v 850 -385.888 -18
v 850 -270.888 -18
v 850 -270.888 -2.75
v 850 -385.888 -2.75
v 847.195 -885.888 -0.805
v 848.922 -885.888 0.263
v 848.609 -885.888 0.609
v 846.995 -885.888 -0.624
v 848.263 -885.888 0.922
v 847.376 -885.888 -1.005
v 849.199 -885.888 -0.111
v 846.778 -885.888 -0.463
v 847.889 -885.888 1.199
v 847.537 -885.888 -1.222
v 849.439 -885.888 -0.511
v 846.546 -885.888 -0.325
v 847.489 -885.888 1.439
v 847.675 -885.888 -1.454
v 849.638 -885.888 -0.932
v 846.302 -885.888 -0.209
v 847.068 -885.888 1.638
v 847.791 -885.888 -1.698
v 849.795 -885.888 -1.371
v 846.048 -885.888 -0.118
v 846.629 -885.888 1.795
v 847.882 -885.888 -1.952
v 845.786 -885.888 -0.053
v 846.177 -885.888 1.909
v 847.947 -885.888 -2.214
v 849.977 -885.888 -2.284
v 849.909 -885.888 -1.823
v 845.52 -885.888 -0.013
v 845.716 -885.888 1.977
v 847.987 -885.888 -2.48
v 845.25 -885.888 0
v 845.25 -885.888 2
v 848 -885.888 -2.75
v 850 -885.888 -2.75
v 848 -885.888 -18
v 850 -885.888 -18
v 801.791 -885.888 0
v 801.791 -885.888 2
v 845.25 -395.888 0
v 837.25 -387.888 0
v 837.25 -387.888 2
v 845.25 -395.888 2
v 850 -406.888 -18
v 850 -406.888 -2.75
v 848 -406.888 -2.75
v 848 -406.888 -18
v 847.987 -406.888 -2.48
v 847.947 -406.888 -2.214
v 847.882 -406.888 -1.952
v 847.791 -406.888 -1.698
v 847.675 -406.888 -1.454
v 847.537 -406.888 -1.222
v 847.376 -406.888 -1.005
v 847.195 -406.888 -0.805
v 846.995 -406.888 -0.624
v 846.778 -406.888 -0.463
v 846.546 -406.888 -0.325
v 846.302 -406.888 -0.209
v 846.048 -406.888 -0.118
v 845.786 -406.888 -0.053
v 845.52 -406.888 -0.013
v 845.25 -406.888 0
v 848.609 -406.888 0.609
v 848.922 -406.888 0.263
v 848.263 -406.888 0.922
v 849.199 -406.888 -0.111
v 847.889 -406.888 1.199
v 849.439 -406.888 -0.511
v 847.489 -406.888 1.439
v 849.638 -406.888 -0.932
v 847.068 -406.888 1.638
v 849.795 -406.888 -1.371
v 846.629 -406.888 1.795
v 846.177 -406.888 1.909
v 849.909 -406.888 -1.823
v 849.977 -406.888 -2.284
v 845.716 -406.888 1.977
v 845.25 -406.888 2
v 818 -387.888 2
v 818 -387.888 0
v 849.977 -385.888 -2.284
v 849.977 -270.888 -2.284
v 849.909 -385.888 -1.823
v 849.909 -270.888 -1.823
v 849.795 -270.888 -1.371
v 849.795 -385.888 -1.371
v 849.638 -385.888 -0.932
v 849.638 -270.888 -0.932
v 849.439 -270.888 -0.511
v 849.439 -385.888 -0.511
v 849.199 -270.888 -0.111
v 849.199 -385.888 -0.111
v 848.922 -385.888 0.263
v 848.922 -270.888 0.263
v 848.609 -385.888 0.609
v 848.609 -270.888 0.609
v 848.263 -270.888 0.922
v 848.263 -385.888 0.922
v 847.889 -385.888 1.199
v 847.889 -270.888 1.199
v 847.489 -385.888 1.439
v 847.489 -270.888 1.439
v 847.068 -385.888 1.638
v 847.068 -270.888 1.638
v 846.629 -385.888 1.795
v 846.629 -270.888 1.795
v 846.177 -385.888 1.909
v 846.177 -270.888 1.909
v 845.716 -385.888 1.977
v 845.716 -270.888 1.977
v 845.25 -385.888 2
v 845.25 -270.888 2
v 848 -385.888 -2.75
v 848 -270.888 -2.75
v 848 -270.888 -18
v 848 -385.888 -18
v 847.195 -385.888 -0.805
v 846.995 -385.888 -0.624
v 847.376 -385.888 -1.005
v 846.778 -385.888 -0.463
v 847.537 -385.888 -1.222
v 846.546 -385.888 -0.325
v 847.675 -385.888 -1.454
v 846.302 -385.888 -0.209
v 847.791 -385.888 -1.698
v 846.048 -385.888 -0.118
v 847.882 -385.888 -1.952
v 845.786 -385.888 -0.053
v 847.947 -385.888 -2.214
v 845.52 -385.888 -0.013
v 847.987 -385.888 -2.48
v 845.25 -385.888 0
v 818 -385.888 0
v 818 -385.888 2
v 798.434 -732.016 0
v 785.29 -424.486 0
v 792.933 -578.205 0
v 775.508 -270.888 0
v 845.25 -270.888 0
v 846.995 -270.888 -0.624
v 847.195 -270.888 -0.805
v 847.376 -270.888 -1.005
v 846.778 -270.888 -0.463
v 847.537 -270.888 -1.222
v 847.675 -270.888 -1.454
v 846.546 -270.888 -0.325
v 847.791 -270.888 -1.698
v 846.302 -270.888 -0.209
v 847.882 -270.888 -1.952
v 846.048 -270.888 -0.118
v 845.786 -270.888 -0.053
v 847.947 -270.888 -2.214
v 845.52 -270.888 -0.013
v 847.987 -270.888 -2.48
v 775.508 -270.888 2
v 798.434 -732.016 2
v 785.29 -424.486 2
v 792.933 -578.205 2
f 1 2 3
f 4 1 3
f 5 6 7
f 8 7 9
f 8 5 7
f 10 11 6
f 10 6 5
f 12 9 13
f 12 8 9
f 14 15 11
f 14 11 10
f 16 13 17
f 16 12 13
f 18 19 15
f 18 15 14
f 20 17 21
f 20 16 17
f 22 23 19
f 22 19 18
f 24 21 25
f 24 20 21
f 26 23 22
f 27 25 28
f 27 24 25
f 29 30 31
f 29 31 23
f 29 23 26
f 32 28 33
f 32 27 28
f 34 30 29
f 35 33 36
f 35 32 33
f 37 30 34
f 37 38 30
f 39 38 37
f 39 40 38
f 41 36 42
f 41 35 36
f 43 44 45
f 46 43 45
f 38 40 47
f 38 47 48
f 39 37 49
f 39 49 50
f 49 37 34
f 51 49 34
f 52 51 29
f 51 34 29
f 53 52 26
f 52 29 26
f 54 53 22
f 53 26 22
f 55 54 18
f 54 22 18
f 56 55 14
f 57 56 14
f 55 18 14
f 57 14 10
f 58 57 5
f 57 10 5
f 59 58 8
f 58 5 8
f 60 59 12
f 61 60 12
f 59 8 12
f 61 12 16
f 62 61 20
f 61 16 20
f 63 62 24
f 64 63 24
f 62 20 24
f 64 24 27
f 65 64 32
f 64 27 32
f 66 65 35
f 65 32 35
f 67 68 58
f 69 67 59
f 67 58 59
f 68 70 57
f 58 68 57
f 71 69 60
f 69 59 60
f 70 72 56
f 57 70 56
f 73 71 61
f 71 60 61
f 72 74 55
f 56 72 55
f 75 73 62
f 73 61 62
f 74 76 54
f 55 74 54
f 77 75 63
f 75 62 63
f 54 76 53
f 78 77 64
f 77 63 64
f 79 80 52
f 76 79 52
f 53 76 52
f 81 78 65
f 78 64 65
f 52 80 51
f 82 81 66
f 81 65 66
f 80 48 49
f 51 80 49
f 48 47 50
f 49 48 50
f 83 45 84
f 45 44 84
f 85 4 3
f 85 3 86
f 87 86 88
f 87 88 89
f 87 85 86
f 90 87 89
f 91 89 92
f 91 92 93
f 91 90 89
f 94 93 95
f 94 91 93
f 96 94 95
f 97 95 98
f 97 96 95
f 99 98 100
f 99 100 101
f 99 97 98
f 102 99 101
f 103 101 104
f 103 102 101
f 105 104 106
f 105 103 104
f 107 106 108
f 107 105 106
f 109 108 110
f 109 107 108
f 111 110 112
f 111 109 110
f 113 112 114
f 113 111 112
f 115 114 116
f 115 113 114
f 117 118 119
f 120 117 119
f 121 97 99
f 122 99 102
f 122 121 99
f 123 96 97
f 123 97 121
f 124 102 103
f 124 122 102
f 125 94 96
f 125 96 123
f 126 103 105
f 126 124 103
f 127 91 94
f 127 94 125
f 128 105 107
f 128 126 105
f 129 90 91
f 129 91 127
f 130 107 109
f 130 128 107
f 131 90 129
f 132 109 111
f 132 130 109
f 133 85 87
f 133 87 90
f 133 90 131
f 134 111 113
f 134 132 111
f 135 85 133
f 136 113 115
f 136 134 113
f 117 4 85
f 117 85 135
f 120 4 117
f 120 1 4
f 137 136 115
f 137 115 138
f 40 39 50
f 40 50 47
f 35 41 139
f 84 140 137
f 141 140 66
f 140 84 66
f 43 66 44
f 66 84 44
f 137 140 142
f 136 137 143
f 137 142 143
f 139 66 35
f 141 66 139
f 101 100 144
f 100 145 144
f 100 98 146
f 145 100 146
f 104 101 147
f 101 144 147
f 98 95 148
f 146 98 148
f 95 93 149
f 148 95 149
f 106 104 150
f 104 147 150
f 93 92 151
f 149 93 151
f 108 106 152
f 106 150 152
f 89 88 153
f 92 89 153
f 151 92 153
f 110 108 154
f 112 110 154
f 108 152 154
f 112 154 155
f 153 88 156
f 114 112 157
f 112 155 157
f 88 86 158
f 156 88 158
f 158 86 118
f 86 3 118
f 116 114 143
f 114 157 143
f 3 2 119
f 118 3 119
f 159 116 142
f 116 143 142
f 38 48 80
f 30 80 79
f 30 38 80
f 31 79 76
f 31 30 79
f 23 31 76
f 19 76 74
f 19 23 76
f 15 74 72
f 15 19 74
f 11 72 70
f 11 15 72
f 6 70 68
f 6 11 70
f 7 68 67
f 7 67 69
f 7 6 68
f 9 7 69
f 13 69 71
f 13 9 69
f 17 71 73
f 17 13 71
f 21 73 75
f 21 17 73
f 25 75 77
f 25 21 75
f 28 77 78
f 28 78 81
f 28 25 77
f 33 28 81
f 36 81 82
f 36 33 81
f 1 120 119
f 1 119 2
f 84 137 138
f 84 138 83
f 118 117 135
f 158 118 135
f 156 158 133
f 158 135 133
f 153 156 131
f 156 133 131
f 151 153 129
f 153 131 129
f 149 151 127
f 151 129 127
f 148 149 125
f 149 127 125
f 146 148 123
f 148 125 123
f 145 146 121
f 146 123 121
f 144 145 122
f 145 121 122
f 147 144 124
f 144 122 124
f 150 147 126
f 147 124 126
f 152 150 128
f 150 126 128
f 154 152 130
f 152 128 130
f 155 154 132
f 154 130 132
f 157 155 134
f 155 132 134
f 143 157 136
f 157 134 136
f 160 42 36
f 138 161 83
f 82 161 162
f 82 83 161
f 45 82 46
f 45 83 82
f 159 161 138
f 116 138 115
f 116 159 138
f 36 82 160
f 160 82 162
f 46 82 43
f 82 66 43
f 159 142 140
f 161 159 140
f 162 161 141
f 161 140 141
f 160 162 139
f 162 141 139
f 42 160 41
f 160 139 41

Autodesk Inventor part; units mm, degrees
ref_plane "YZ Plane" through (0, 0, 0) normal (1, 0, 0) x (0, 1, 0)
ref_plane "XZ Plane" through (0, 0, 0) normal (0, 1, 0) x (-1, 0, 0)
ref_plane "XY Plane" through (0, 0, 0) normal (0, 0, 1) x (1, 0, 0)
sketch "Sketch1" plane through (0, 0, 0) normal (0, 0, 1) x (1, 0, 0)
  arc A0 (750, -2100) -> (771.0671, -250.888) centre (-10250, -1050) ccw construction
  arc A1 (752.9864, -2100.2851) -> (772.2226, -225.7318) centre (-10246.9893, -1050.0309) ccw
  line L0 (-750, -2700) -> (-750, 0) construction
  line L1 (-800, 50) -> (-800, -2750) construction
  line L2 (-850, -2800) -> (-850, 100) construction
  line L3 (850, 100) -> (850, -2800)
  line L4 (800, -2750) -> (800, 50) construction
  line L5 (750, 0) -> (750, -2700) construction
  line L6 (771.0671, -250.888) -> (768.075, -251.105) construction
  line L7 (769.231, -225.9556) -> (772.2226, -225.7318) construction
  arc A2 (747.4657, -5.0326) -> (744.8748, -2.3426) centre (744.4792, -5.3164) ccw construction
  arc A3 (747.4657, -5.0326) -> (747.0136, -0.2851) centre (-10252.9897, -1050.251) ccw construction
  arc A4 (768.075, -251.105) -> (747.4657, -5.0326) centre (-10252.9897, -1050.251) ccw construction
  line L8 (750, 0) -> (747.0136, -0.2851) construction
  arc A5 (750.4522, -4.7486) -> (750, 0) centre (-10250, -1050) ccw construction
  arc A6 (750.4522, -4.7486) -> (745.2706, 0.6314) centre (744.4791, -5.3162) ccw
  line L9 (-750, 0) -> (750, 0) construction
  line L10 (-850, 100) -> (850, 100) construction
  line L11 (800, 50) -> (-800, 50) construction
  arc A7 (771.0671, -250.888) -> (750.4522, -4.7486) centre (-10250, -1050) ccw
  line L12 (750, -2700) -> (-750, -2700) construction
  line L13 (750, -2100) -> (752.9864, -2100.2851) construction
  line L14 (-800, -2750) -> (800, -2750)
  line L15 (850, -2800) -> (-850, -2800) construction
  arc A8 (110, -2700) -> (114.1118, -2698.3696) centre (110, -2694) ccw construction
  line L16 (0, -2697) -> (110, -2697) construction
  line L17 (0, -2700) -> (0, -2697) construction
  arc A9 (750, 0) -> (745.2706, 0.6314) centre (0, -5600) ccw construction
  line L18 (750, 0) -> (749.6018, -2.9735) construction
  arc A10 (750, -3.0268) -> (0, 47) centre (-0.2, -5603) ccw construction
  line L19 (0, 47) -> (0, 0) construction
  line L20 (0, 50) -> (0, 47) construction
  line L21 (0, 100) -> (0, 50)
  arc A11 (745.2706, 0.6314) -> (0, 50) centre (0, -5600) ccw construction
  line L22 (-750, -2100) -> (750, -2100) construction
  arc A12 (110, -2697) -> (112.0559, -2696.1848) centre (110, -2694) ccw construction
  line L23 (676.3163, -2173.4556) -> (674.2605, -2171.2708) construction
  line L24 (690.4112, -2151.9536) -> (692.4671, -2154.1384) construction
  line L25 (752.0559, -2102.1848) -> (676.3163, -2173.4556) construction
  line L26 (114.1118, -2698.3696) -> (750, -2100) construction
  arc A13 (752.0559, -2102.1848) -> (752.9864, -2100.2851) centre (749.9998, -2099.9999) ccw construction
  line L27 (750, -2100) -> (752.0559, -2102.1848) construction
  arc A14 (749.1768, -2100.7746) -> (750.1074, -2098.8746) centre (747.1209, -2098.5898) ccw construction
  line L28 (112.0559, -2696.1848) -> (690.4112, -2151.9536) construction
  line L29 (850, -270.888) -> (775.5075, -270.888)
  arc A15 (800, 50) -> (0, 100) centre (0, -6325) ccw construction
  arc A16 (825.5075, -270.888) -> (800, 50) centre (-10637.5382, -1020.6324) ccw construction
  line L30 (825.5075, -270.888) -> (825.5075, 100) construction
  arc A17 (790.2374, -2130.793) -> (825.5075, -270.888) centre (-10200.9329, -992.0761) ccw construction
  line L31 (0, -2700) -> (0, -2750) construction
  line L32 (112.3791, -2700) -> (132.2053, -2750) construction
  line L33 (132.2053, -2750) -> (850, -2074.5565)
  arc A18 (771.0107, -250.8921) -> (767.3384, -201.0273) centre (769.231, -225.9556) ccw construction
  line L34 (850, -400) -> (783.8747, -400) construction
  line L35 (850, -900) -> (801.9921, -900) construction
  line L36 (850, -1400) -> (797.4673, -1400) construction
  line L37 (850, -1900) -> (770.2723, -1900) construction
  line L38 (350, 100) -> (350, 39.1489)
  line L39 (-1472.612, -150) -> (-973.4947, -150)
  line L40 (-1472.612, -700) -> (-973.4947, -700)
  line L41 (-1472.612, -1250) -> (-973.4947, -1250)
  line L42 (-1472.612, -1800) -> (-973.4947, -1800)
  line L43 (800, -2750) -> (850, -2750) construction
  line L44 (752.9864, -2100.2851) -> (850, -2100.2851)
  point P0 (822.6583, -2100.2851)
  dimension "d16" = 1500
  dimension "d17" = 2700
  dimension "d18" = 2100
  dimension "d19" = 6
  dimension "d20" = 3
  dimension "d21" = 3
  dimension "d22" = 6
  dimension "d23" = 3
  dimension "d24" = 251.771
  dimension "d25" = 50
  dimension "d26" = 50
  dimension "d27" = 3
  dimension "d28" = 110
  dimension "d29" = 25
  dimension "d30" = 104
  dimension "d31" = 25
  dimension "d32" = 20
  dimension "d33" = 50
  dimension "d57" = 500
  dimension "d58" = 500
  dimension "d59" = 500
  dimension "d60" = 500
  dimension "d61" = 500
  dimension "d83" = 250
  dimension "d86" = 550
  dimension "d91" = 274.5565
extrude "Plate3" add sketch "Sketch1" along normal blind 2
sketch "Sketch3" plane through (848, -270.888, 2) normal (1, 0, 0) x (0, 1, 0)
  line L0 (-1829.397, 0) -> (0, 0)
  line L1 (0, 0) -> (0, 20)
  line L2 (0, 20) -> (-1829.397, 20)
  line L3 (-1829.397, 20) -> (-1829.397, 0)
edge flange "Flange2" height 20 angle 90 thickness 2 bend radius 2.75 thickness toward (1, 0, 0) relief round relief width 2 relief depth 1 edges at (850, -1172.7223, 2) wall of the first edge with corners at (848, -2100.2851, 2) (848, -270.888, 2) (848, -270.888, -18) (848, -2100.2851, -18)
bend "Bend2"
corner "Corner2"
sketch "Sketch5" plane through (0, 0, 0) normal (0, 0, 1) x (1, 0, 0)
  line L0 (845.25, -2100.2851) -> (845.25, -270.888) projected
  line L1 (775.5075, -270.888) -> (845.25, -270.888) projected
  arc A0 (752.9864, -2100.2851) -> (775.5075, -270.888) centre (-10246.9893, -1050.0309) ccw projected
  line L2 (850, -270.888) -> (850, -2100.2851) projected
  line L3 (850, -385.888) -> (818, -385.888)
  line L4 (850, -387.888) -> (848, -387.888) construction
  line L5 (848, -2100.2851) -> (848, -270.888) projected
  line L6 (818, -385.888) -> (818, -387.888)
  line L7 (850, -885.887) -> (801.7915, -885.887) construction
  line L8 (850, -887.887) -> (801.821, -887.887) construction
  line L9 (819, -885.887) -> (819, -887.887) construction
  line L10 (850, -1385.887) -> (797.9055, -1385.887) construction
  line L11 (850, -1387.887) -> (797.8445, -1387.887) construction
  line L12 (819, -1385.887) -> (819, -1387.887) construction
  line L13 (850, -1885.887) -> (771.352, -1885.887) construction
  line L14 (850, -1887.887) -> (771.2001, -1887.887) construction
  line L15 (819, -1885.887) -> (819, -1887.887) construction
  line L16 (850, -906.887) -> (845.25, -906.887) construction
  line L17 (845.25, -1406.887) -> (850, -1406.887) construction
  line L18 (845.25, -1906.887) -> (850, -1906.887) construction
  line L19 (845.25, -2100.2851) -> (752.9864, -2100.2851) projected
  line L20 (850, -385.888) -> (850, -406.888)
  line L21 (848, -385.888) -> (848, -387.888) construction
  line L22 (850, -406.888) -> (848, -406.888)
  line L23 (818, -385.888) -> (783.034, -385.888) construction
  line L24 (818, -387.888) -> (783.1542, -387.888) construction
  line L25 (848, -387.888) -> (848, -406.888)
  line L26 (848, -387.888) -> (818, -387.888)
  line L27 (848, -406.888) -> (845.25, -406.888)
  point P0 (0, 0)
  point P1 (845.25, -380.4205)
  point P2 (848, -380.4205)
  point P3 (848, -1906.887)
  point P4 (848, -1887.887)
  point P5 (848, -1406.887)
  point P6 (848, -1387.887)
  point P7 (848, -906.887)
  point P8 (848, -887.887)
  point P9 (818, -386.888)
  point P10 (848, -406.888)
  point P11 (850, -410.4205)
  point P12 (848, -385.888)
  point P13 (819, -886.887)
  point P14 (819, -1386.887)
  point P15 (819, -1886.887)
  point P16 (848, -406.888)
  point P17 (845.25, -387.888)
  dimension "d69" = 1829.397
  dimension "d70" = 2
  dimension "d76" = 66.966
  dimension "d80" = 48.2085
  dimension "d81" = 31
  dimension "d94" = 21
  dimension "d95" = 31
  dimension "d96" = 21
  dimension "d97" = 31
  dimension "d98" = 21
  dimension "d102" = 78.648
  dimension "d104" = 52.0945
  dimension "d106" = 2
  dimension "d107" = 21
  dimension "d108" = 116
  dimension "d109" = 500
  dimension "d110" = 500
  dimension "d111" = 500
  dimension "d112" = 32
extrude "Extrusion2" cut sketch "Sketch5" along normal through all both and the other way through all contours L0 L26 L5 L27 | L26 L6 L3 L0 | L0 L3 L5 L26 | L5 L3 L2 L22
chamfer "Chamfer2" distance 8 angle 45 1 edges at (845.25, -387.888, 1)
pattern_linear "Rectangular Pattern3" count 4 spacing 500 along (0, -1, 0) of "Extrusion2", "Chamfer2"
sketch "Sketch6" plane through (0, 0, 0) normal (0, 0, -1) x (-1, 0, 0)
  line L0 (-803.1643, -805.888) -> (-817.1643, -805.888) construction
  line L1 (-817.1643, -805.888) -> (-817.1643, -605.888) construction
  line L2 (-817.1643, -605.888) -> (-803.1643, -605.888) construction
  line L3 (-803.1643, -605.888) -> (-803.1643, -805.888) construction
  line L4 (-752.9864, -2100.2851) -> (-845.25, -2100.2851) projected
  line L5 (-803.1643, -1810.888) -> (-803.1643, -1860.888) construction
  line L6 (-803.1643, -1860.888) -> (-815.1643, -1860.888) construction
  line L7 (-815.1643, -1860.888) -> (-815.1643, -1810.888) construction
  line L8 (-815.1643, -1810.888) -> (-803.1643, -1810.888) construction
  line L9 (-845.25, -1885.888) -> (-818, -1885.888) projected
  line L10 (-803.1643, -1310.888) -> (-803.1643, -1360.888) construction
  line L11 (-803.1643, -1360.888) -> (-815.1643, -1360.888) construction
  line L12 (-815.1643, -1360.888) -> (-815.1643, -1310.888) construction
  line L13 (-815.1643, -1310.888) -> (-803.1643, -1310.888) construction
  line L14 (-803.1643, -810.888) -> (-803.1643, -860.888) construction
  line L15 (-803.1643, -860.888) -> (-815.1643, -860.888) construction
  line L16 (-815.1643, -860.888) -> (-815.1643, -810.888) construction
  line L17 (-815.1643, -810.888) -> (-803.1643, -810.888) construction
  line L18 (-803.1643, -310.888) -> (-803.1643, -360.888) construction
  line L19 (-803.1643, -360.888) -> (-815.1643, -360.888) construction
  line L20 (-815.1643, -360.888) -> (-815.1643, -310.888) construction
  line L21 (-815.1643, -310.888) -> (-803.1643, -310.888) construction
  line L22 (-845.25, -1385.888) -> (-818, -1385.888) projected
  line L23 (-845.25, -885.888) -> (-818, -885.888) projected
  line L24 (-845.25, -385.888) -> (-818, -385.888) projected
  point P0 (0, 0)
  point P1 (-753.1643, -2098.4205)
  point P2 (-824.6397, -2098.4205)
  dimension "d120" = 200
  dimension "d121" = 14
  dimension "d124" = 50
  dimension "d125" = 12
  dimension "d126" = 50
  dimension "d127" = 25
  dimension "d128" = 50
  dimension "d129" = 12
  dimension "d130" = 50
  dimension "d131" = 12
  dimension "d132" = 50
  dimension "d133" = 12
  dimension "d134" = 50
  dimension "d135" = 25
  dimension "d136" = 25
  dimension "d137" = 25
  dimension "d138" = 50
  dimension "d139" = 50
  dimension "d140" = 50
  dimension "d143" = 80
mark "Mark1"
sketch "Sketch7" plane through (0, 0, 0) normal (0, 0, 1) x (1, 0, 0)
  line L0 (837.25, -1887.888) -> (845.25, -1895.888) construction
  line L1 (837.25, -1887.888) -> (818, -1887.888) construction
  line L2 (818, -1887.888) -> (818, -1885.888) construction
  line L3 (818, -1885.888) -> (845.25, -1885.888) construction
  line L4 (845.25, -1885.888) -> (845.25, -1406.888) construction
  line L5 (845.25, -1406.888) -> (845.25, -1395.888) construction
  line L6 (837.25, -1387.888) -> (845.25, -1395.888) construction
  line L7 (837.25, -1387.888) -> (818, -1387.888) construction
  line L8 (818, -1387.888) -> (818, -1385.888) construction
  line L9 (818, -1385.888) -> (845.25, -1385.888) construction
  line L10 (845.25, -1385.888) -> (845.25, -906.888) construction
  line L11 (845.25, -906.888) -> (845.25, -895.888) construction
  line L12 (837.25, -887.888) -> (845.25, -895.888) construction
  line L13 (837.25, -887.888) -> (818, -887.888) construction
  line L14 (818, -887.888) -> (818, -885.888) construction
  line L15 (818, -885.888) -> (845.25, -885.888) construction
  line L16 (845.25, -885.888) -> (845.25, -406.888) construction
  line L17 (845.25, -406.888) -> (845.25, -395.888) projected
  line L18 (837.25, -387.888) -> (845.25, -395.888) projected
  line L19 (837.25, -387.888) -> (818, -387.888) projected
  line L20 (818, -387.888) -> (818, -385.888) projected
  line L21 (818, -385.888) -> (845.25, -385.888) projected
  line L22 (845.25, -385.888) -> (845.25, -270.888) projected
  line L23 (775.5075, -270.888) -> (845.25, -270.888) projected
  arc A0 (752.9864, -2100.2851) -> (775.5075, -270.888) centre (-10246.9893, -1050.0309) ccw construction
  line L24 (845.25, -2100.2851) -> (752.9864, -2100.2851) construction
  line L25 (845.25, -2100.2851) -> (845.25, -1906.888) construction
  line L26 (845.25, -1906.888) -> (845.25, -1895.888) construction
  line L27 (716.6808, -2324.332) -> (990.5996, -2324.332)
  line L28 (990.5996, -2324.332) -> (990.5996, -885.888)
  line L29 (990.5996, -885.888) -> (716.6808, -885.888)
  line L30 (716.6808, -885.888) -> (716.6808, -2324.332)
  line L31 (848, -1385.888) -> (845.25, -1385.888) projected
  line L32 (845.25, -906.888) -> (845.25, -1385.888) projected
  line L33 (845.25, -906.888) -> (848, -906.888) projected
  line L34 (848, -1385.888) -> (848, -906.888) projected
  line L35 (848, -885.888) -> (845.25, -885.888) projected
  line L36 (845.25, -406.888) -> (845.25, -885.888) projected
  line L37 (845.25, -406.888) -> (848, -406.888) projected
  line L38 (848, -885.888) -> (848, -406.888) projected
  point P0 (0, 0)
extrude "Extrusion3" cut sketch "Sketch7" along normal through all both and the other way through all contours L30 L29 L28 L27 | L31 L32 L33 L34
equation "\"d16\" = d34"
equation "\"d17\" = d35"
equation "\"d18\" = d36"
equation "\"d19\" = d37"
equation "\"d20\" = d38"
equation "\"d21\" = d39"
equation "\"d22\" = d39 + d43"
equation "\"d23\" = d39"
equation "\"d27\" = d39"
equation "\"d28\" = 0.5 * d44"
equation "\"d29\" = d41"
equation "\"d30\" = d42"
equation "\"d31\" = d41"
equation "\"d33\" = d25"
equation "\"Стрингер_3\" = 66.766"
equation "\"d37\" = d39 + d43"
equation "\"d38\" = d39"
equation "\"d43\" = d39"
equation "\"Стрингер_4\" = 48.00853"
equation "\"Стрингер_5\" = 51.89453"
equation "\"Стрингер_6\" = 78.44803"
equation "\"d34\" = 1500"
equation "\"d35\" = 2700"
equation "\"d36\" = 2100"
equation "\"d39\" = 3"
equation "\"d44\" = 220"
equation "\"d41\" = 25"
equation "\"d42\" = 104"
properties part number "MSC 054 rib hip 1" material "Stainless Steel"
